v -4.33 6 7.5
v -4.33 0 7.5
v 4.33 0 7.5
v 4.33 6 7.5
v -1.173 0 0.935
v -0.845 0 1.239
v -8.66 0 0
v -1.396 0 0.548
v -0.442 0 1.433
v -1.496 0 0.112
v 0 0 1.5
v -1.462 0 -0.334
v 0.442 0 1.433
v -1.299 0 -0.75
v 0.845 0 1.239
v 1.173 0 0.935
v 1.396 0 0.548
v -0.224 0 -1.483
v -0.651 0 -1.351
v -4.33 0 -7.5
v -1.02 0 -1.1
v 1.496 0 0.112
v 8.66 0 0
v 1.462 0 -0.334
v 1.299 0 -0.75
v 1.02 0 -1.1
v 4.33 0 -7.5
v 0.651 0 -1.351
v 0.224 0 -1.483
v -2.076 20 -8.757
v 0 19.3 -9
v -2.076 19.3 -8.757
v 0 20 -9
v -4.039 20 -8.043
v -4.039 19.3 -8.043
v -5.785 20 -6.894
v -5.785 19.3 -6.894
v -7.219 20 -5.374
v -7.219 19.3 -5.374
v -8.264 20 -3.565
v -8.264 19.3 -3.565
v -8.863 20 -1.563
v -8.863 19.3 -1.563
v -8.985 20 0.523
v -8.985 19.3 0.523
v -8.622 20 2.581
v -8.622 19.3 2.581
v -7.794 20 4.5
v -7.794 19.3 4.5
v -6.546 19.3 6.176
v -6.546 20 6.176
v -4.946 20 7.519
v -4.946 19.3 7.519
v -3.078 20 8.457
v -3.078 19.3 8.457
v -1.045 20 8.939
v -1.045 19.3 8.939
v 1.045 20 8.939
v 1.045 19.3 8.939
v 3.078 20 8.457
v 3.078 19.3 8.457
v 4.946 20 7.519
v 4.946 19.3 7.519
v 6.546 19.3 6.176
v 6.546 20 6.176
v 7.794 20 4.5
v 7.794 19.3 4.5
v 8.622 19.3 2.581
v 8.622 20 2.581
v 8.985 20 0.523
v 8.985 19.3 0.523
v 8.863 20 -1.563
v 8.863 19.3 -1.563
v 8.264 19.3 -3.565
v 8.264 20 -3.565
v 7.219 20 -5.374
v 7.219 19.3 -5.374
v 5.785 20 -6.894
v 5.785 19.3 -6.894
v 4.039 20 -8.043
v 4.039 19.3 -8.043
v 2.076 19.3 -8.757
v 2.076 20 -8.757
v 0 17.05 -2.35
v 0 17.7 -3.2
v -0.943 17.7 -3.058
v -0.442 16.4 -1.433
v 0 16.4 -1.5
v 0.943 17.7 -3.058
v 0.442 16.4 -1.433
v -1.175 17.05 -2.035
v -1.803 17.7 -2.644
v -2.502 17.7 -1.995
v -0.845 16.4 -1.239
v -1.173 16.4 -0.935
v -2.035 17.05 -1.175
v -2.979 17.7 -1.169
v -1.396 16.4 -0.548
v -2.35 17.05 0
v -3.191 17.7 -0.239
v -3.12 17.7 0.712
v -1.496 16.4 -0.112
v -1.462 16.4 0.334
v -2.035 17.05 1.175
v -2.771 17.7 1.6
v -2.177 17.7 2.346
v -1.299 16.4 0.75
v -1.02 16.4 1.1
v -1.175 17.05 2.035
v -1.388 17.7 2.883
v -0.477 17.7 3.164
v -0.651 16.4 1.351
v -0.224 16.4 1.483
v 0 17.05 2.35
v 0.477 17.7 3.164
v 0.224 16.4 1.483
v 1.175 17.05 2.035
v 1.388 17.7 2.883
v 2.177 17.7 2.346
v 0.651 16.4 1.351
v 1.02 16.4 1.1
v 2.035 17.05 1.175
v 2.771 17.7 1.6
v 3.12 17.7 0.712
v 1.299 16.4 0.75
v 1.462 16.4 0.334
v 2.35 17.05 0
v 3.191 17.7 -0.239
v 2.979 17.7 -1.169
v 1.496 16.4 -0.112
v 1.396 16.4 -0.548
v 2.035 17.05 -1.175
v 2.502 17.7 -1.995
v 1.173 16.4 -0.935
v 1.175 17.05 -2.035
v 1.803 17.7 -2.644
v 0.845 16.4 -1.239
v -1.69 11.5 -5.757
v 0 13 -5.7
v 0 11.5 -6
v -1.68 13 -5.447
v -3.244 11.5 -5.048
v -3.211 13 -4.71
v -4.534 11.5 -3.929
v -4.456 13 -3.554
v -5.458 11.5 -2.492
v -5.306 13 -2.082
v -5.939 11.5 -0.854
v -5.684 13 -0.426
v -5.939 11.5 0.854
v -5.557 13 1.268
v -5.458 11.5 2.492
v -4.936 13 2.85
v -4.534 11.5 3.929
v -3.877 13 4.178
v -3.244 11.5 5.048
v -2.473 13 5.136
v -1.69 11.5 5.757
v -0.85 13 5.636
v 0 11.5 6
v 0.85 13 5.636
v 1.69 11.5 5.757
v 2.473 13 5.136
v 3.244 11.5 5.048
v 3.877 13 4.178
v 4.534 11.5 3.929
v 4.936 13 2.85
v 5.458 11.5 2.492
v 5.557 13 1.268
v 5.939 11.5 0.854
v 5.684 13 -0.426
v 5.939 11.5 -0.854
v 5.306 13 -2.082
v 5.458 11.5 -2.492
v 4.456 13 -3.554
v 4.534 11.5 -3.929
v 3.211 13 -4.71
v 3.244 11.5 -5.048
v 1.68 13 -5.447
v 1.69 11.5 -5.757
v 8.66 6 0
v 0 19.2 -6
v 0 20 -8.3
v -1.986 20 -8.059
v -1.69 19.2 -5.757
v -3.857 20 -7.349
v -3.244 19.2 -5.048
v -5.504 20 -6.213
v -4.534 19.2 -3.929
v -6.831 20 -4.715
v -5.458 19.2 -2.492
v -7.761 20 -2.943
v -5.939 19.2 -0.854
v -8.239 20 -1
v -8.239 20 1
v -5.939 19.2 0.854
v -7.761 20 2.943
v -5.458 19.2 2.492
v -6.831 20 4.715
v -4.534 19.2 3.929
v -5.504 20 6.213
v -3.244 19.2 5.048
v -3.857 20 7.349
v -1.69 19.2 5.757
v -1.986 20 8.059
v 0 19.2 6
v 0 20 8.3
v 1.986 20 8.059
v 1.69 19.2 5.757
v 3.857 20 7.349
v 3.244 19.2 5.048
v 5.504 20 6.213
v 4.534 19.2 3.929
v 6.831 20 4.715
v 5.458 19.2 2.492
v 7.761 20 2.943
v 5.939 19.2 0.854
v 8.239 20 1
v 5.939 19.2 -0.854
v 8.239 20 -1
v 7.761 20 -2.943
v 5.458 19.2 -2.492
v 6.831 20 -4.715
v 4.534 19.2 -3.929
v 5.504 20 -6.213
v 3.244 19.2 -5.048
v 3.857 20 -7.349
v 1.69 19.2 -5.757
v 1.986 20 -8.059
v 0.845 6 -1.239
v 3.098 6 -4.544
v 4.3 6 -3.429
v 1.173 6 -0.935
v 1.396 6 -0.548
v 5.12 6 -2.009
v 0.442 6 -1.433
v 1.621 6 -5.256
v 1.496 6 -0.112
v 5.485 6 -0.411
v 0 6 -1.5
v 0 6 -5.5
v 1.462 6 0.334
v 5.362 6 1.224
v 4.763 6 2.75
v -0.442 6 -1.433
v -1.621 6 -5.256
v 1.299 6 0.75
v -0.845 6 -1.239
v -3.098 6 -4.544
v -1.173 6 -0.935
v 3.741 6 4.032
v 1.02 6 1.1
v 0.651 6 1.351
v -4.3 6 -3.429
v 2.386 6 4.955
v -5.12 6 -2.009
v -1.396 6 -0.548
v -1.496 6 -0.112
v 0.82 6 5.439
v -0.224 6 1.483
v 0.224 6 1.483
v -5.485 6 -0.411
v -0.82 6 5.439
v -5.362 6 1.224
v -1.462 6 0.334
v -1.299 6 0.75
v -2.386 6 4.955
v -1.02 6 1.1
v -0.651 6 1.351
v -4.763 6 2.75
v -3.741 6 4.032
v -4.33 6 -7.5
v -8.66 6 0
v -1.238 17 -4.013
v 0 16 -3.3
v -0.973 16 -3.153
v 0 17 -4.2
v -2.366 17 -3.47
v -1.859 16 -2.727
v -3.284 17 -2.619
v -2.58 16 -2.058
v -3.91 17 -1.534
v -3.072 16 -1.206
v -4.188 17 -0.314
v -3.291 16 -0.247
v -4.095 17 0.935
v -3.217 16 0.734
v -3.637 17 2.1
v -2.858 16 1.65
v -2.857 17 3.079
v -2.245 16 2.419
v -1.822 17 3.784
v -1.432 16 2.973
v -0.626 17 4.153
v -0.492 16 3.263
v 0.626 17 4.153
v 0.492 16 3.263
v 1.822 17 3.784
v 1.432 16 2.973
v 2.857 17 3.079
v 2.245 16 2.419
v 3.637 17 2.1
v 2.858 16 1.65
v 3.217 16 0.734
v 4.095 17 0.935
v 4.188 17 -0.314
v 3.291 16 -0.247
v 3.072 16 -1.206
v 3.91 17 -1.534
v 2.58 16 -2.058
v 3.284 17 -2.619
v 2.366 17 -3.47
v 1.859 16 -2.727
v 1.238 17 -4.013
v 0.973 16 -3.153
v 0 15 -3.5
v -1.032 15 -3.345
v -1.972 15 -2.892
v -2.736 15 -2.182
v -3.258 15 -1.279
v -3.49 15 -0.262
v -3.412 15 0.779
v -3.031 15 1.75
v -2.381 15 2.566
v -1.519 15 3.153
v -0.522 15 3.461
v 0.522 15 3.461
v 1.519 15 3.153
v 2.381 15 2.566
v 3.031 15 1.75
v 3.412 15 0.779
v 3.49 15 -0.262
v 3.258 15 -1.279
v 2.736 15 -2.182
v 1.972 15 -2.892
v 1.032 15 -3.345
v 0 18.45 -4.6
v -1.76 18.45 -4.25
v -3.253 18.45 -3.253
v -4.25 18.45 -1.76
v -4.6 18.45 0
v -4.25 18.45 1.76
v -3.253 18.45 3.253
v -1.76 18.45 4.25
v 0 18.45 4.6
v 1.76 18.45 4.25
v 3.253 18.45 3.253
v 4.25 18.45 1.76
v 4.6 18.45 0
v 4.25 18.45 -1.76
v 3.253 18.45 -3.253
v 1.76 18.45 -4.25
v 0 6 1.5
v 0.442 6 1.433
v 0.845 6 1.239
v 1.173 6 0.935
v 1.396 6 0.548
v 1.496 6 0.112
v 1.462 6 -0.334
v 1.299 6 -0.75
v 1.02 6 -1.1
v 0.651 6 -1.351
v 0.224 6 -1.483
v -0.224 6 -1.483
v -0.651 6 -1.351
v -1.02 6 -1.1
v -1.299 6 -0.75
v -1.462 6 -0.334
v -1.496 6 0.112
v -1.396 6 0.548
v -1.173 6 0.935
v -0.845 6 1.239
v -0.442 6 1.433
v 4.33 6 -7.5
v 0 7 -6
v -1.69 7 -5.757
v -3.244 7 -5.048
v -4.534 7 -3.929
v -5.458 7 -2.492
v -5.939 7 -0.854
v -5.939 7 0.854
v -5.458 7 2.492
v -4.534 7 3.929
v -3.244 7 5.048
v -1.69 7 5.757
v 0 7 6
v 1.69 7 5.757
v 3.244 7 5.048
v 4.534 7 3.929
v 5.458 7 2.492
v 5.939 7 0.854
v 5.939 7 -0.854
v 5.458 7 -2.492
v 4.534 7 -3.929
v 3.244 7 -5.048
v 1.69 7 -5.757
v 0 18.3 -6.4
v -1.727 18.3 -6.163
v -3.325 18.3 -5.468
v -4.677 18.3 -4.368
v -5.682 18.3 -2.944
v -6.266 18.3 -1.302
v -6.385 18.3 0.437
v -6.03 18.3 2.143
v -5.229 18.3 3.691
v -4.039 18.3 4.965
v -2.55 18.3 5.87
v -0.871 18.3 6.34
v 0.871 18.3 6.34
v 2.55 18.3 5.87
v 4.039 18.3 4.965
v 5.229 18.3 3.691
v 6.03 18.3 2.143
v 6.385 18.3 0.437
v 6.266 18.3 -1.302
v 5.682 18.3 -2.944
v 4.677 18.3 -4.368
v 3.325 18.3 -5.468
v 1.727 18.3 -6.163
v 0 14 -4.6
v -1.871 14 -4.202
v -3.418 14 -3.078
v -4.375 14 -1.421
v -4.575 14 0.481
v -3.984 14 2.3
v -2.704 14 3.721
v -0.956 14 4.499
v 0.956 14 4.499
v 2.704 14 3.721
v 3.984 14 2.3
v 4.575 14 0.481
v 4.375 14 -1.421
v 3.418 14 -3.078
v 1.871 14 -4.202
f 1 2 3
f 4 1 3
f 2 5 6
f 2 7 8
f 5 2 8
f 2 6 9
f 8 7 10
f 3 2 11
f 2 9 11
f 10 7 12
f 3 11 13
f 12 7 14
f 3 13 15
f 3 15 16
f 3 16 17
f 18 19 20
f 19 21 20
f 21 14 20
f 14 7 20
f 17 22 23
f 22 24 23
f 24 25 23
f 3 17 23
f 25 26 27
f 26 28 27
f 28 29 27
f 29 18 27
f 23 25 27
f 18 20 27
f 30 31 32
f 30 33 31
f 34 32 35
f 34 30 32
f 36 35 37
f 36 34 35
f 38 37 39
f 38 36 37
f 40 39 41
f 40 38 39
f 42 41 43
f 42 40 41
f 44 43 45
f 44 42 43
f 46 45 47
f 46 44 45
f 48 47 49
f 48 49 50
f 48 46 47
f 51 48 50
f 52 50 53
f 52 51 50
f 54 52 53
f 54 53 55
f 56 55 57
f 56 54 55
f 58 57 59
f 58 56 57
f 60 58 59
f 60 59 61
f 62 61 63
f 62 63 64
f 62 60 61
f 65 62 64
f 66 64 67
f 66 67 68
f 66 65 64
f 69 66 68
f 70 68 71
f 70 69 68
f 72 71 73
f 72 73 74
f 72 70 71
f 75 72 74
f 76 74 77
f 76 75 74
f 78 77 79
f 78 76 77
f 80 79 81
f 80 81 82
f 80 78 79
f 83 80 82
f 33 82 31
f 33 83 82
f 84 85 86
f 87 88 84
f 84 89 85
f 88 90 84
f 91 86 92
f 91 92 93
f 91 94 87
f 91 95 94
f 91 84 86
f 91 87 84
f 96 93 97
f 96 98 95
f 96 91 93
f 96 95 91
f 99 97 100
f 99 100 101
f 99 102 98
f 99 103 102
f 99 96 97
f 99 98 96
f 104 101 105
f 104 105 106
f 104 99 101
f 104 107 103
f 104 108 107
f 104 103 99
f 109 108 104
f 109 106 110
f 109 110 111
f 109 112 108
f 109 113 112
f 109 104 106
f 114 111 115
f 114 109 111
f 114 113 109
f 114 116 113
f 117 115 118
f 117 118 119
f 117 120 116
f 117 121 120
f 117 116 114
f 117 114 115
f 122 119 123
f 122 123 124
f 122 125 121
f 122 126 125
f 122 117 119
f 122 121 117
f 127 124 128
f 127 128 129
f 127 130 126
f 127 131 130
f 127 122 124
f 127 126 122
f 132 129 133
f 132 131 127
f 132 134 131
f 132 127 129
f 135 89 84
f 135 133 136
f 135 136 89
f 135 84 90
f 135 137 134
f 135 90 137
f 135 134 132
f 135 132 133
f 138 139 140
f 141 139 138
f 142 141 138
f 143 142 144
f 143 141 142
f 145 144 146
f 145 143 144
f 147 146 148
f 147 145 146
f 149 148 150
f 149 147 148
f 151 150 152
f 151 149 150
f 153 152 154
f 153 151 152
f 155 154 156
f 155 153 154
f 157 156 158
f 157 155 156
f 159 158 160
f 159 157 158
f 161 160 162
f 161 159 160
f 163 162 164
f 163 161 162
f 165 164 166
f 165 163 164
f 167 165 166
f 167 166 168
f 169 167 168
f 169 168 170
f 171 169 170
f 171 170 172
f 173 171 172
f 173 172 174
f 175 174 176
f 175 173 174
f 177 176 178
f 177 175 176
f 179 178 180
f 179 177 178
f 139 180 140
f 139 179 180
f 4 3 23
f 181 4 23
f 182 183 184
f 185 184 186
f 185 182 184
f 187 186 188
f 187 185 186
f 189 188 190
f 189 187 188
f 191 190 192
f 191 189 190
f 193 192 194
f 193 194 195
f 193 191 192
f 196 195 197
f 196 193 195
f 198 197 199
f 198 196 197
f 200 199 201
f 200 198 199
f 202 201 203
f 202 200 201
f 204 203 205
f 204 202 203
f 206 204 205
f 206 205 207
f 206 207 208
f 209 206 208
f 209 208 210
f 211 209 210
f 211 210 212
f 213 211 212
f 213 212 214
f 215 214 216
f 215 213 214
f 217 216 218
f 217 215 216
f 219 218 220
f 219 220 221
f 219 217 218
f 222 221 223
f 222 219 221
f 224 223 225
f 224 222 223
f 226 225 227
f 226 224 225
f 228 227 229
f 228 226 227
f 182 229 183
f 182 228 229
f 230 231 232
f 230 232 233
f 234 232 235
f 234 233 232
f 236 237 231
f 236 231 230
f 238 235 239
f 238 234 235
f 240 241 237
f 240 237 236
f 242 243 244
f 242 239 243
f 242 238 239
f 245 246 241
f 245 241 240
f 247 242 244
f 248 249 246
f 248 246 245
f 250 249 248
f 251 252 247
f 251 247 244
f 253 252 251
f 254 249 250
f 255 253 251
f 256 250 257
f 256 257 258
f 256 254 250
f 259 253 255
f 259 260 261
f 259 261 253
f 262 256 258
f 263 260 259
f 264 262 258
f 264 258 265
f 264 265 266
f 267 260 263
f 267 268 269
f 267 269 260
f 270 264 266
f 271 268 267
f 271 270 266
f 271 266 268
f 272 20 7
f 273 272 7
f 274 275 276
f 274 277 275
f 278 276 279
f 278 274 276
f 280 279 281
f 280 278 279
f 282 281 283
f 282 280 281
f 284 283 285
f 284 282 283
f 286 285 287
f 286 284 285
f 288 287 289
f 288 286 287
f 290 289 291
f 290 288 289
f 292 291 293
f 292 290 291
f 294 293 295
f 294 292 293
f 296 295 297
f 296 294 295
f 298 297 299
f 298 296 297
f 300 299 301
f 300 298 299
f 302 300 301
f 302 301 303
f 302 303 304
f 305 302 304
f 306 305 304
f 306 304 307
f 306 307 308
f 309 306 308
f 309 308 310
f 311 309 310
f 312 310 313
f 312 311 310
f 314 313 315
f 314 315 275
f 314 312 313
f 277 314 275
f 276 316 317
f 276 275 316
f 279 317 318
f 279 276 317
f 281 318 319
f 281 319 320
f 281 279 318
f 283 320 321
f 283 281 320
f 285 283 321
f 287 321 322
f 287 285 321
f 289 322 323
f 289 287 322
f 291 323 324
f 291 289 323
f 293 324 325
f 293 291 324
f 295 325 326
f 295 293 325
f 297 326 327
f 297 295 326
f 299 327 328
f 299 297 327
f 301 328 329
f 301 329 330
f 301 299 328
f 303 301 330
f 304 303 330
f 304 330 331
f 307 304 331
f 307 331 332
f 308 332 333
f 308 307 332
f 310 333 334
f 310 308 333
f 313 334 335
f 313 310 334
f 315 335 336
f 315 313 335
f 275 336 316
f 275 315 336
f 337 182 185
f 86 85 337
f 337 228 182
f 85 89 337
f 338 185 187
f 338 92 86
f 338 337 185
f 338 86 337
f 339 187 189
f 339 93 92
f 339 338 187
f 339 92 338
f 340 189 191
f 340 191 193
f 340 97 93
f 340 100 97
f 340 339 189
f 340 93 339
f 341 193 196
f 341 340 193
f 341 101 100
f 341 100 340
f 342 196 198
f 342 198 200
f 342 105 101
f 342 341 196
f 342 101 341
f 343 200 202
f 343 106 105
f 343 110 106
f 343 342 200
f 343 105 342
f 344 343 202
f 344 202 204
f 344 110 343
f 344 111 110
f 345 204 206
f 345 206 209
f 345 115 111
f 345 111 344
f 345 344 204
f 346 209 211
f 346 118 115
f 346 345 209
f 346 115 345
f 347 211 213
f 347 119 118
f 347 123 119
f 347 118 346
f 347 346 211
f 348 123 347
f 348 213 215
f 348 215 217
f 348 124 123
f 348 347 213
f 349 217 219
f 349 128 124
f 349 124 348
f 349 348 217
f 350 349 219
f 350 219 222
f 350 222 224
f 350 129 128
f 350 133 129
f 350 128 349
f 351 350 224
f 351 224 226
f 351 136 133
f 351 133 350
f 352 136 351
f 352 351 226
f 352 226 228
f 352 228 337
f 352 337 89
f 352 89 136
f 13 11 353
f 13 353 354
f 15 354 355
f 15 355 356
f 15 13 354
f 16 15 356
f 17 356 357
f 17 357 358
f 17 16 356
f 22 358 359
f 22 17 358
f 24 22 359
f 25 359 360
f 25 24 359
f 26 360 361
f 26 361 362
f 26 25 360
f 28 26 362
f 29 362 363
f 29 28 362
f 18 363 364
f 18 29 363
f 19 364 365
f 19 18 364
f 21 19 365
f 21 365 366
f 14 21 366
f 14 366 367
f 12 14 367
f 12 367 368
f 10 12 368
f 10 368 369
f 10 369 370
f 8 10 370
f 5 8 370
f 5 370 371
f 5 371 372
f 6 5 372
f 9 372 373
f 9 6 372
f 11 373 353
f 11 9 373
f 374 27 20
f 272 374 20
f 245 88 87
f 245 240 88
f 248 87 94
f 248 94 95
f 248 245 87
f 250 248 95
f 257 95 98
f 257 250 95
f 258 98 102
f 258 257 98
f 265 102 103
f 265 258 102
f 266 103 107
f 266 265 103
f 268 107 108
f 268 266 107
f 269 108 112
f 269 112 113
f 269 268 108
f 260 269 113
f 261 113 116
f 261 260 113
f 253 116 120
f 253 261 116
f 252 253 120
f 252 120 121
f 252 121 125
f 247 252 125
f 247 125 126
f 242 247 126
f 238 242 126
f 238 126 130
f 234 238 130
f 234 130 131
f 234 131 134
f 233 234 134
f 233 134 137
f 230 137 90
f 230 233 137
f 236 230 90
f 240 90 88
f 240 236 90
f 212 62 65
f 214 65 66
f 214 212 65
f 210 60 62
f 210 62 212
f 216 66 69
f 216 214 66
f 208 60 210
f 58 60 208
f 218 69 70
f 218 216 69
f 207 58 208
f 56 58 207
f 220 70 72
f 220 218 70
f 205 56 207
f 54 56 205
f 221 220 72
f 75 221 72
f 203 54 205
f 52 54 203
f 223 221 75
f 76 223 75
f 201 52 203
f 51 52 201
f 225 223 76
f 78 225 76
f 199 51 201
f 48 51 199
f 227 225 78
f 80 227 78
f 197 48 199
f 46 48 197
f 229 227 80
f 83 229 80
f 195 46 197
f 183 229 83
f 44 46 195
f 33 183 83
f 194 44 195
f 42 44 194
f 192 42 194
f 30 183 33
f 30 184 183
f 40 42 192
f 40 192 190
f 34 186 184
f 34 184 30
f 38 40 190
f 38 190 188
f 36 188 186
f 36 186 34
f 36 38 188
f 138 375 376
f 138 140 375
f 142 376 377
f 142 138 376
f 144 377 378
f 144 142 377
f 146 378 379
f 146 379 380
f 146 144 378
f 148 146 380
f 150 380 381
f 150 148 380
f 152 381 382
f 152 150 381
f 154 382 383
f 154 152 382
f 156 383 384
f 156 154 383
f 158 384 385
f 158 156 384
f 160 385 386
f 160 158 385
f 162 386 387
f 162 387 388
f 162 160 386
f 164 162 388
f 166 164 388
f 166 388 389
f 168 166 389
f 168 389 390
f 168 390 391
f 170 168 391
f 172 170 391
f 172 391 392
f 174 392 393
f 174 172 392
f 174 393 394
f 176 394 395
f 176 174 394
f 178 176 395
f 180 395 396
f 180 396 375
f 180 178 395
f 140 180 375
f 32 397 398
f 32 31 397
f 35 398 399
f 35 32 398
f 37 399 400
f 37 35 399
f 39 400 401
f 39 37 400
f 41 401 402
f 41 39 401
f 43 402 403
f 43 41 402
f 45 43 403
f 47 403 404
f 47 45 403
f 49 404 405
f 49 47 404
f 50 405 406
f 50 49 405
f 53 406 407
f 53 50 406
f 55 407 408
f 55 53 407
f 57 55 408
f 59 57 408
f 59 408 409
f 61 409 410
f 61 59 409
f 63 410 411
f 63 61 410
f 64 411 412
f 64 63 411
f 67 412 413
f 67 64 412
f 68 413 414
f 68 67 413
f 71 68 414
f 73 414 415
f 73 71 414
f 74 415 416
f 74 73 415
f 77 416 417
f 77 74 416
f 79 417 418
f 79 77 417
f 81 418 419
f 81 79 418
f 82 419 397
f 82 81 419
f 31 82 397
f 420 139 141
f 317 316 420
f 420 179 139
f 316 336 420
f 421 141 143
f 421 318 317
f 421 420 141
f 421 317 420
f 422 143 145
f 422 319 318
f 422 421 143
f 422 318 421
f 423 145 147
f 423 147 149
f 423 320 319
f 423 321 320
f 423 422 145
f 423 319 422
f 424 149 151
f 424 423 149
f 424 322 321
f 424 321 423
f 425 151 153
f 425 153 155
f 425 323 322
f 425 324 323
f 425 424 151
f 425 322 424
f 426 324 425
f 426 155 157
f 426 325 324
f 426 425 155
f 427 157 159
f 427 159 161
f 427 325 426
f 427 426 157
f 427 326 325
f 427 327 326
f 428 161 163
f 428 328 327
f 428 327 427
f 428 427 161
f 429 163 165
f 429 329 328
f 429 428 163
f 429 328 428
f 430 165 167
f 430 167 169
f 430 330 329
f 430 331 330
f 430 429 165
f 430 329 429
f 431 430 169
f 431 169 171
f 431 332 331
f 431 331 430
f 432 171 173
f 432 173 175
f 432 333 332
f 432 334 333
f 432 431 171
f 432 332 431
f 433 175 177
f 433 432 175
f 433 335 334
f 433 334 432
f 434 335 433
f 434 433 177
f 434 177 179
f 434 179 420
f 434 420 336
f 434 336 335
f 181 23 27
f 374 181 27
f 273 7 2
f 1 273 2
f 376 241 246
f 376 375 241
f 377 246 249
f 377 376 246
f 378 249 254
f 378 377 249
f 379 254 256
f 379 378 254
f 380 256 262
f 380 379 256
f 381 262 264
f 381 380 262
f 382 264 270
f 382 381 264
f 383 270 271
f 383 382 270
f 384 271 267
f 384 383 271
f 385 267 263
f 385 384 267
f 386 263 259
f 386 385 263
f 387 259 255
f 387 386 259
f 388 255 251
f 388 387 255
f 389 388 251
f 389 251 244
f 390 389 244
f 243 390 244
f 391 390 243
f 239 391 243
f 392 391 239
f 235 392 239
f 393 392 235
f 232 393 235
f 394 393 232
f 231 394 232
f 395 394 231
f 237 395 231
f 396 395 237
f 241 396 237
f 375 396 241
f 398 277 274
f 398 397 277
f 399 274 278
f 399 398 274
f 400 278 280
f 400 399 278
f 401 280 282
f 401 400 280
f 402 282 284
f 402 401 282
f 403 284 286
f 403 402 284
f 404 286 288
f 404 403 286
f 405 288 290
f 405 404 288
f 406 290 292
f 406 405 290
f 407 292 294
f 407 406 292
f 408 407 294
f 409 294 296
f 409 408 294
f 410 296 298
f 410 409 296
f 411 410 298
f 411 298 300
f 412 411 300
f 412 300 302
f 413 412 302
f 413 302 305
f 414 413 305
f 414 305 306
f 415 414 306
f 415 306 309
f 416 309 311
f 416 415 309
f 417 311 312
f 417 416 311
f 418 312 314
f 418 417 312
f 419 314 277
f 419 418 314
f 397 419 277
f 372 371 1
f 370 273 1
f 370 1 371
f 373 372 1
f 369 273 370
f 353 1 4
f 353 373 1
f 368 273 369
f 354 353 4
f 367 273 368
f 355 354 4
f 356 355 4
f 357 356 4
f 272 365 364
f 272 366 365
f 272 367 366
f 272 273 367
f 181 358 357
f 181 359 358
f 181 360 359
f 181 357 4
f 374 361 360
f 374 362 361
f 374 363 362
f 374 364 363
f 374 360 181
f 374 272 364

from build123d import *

# Parameters (mm, degrees)
SKETCH_1_R      = 1.5
AF15_H6_3_DEPTH = 6


with BuildPart() as part:
    # 草圖1 → 六角底座_AF15_H6_通氣孔3 (new body)
    with BuildSketch(Plane(origin=(0, 0, 0), x_dir=(1, 0, 0), z_dir=(0, 1, 0))):
        Polygon((8.660254038, 0), (4.330127019, 7.5), (-4.330127019, 7.5), (-8.660254038, 0), (-4.330127019, -7.5), (4.330127019, -7.5), align=None)
        with Locations(Location((0, 0, 0), (0, 0, 270))):
            Circle(SKETCH_1_R, mode=Mode.SUBTRACT)
    extrude(amount=AF15_H6_3_DEPTH)


with BuildPart() as body_2:
    # 草圖2 → 吸盤_口徑18_H14_中空唇口 (revolve)
    with BuildSketch(Plane.XY, mode=Mode.PRIVATE) as revolve_18_h14_sk:
        Polygon((1.5, 6), (5.5, 6), (6, 7), (6, 11.5), (5.7, 13), (3.5, 15), (3.3, 16), (4.2, 17), (6.4, 18.3), (9, 19.3), (9, 20), (8.3, 20), (6, 19.2), (3.2, 17.7), (1.5, 16.4), align=None)
    revolve(revolve_18_h14_sk.sketch.rotate(Axis((0, 0, 0), (0, 1, 0)), 90), axis=Axis((0, 0, 0), (0, 1, 0)))


solid = Compound([part.part, body_2.part])
